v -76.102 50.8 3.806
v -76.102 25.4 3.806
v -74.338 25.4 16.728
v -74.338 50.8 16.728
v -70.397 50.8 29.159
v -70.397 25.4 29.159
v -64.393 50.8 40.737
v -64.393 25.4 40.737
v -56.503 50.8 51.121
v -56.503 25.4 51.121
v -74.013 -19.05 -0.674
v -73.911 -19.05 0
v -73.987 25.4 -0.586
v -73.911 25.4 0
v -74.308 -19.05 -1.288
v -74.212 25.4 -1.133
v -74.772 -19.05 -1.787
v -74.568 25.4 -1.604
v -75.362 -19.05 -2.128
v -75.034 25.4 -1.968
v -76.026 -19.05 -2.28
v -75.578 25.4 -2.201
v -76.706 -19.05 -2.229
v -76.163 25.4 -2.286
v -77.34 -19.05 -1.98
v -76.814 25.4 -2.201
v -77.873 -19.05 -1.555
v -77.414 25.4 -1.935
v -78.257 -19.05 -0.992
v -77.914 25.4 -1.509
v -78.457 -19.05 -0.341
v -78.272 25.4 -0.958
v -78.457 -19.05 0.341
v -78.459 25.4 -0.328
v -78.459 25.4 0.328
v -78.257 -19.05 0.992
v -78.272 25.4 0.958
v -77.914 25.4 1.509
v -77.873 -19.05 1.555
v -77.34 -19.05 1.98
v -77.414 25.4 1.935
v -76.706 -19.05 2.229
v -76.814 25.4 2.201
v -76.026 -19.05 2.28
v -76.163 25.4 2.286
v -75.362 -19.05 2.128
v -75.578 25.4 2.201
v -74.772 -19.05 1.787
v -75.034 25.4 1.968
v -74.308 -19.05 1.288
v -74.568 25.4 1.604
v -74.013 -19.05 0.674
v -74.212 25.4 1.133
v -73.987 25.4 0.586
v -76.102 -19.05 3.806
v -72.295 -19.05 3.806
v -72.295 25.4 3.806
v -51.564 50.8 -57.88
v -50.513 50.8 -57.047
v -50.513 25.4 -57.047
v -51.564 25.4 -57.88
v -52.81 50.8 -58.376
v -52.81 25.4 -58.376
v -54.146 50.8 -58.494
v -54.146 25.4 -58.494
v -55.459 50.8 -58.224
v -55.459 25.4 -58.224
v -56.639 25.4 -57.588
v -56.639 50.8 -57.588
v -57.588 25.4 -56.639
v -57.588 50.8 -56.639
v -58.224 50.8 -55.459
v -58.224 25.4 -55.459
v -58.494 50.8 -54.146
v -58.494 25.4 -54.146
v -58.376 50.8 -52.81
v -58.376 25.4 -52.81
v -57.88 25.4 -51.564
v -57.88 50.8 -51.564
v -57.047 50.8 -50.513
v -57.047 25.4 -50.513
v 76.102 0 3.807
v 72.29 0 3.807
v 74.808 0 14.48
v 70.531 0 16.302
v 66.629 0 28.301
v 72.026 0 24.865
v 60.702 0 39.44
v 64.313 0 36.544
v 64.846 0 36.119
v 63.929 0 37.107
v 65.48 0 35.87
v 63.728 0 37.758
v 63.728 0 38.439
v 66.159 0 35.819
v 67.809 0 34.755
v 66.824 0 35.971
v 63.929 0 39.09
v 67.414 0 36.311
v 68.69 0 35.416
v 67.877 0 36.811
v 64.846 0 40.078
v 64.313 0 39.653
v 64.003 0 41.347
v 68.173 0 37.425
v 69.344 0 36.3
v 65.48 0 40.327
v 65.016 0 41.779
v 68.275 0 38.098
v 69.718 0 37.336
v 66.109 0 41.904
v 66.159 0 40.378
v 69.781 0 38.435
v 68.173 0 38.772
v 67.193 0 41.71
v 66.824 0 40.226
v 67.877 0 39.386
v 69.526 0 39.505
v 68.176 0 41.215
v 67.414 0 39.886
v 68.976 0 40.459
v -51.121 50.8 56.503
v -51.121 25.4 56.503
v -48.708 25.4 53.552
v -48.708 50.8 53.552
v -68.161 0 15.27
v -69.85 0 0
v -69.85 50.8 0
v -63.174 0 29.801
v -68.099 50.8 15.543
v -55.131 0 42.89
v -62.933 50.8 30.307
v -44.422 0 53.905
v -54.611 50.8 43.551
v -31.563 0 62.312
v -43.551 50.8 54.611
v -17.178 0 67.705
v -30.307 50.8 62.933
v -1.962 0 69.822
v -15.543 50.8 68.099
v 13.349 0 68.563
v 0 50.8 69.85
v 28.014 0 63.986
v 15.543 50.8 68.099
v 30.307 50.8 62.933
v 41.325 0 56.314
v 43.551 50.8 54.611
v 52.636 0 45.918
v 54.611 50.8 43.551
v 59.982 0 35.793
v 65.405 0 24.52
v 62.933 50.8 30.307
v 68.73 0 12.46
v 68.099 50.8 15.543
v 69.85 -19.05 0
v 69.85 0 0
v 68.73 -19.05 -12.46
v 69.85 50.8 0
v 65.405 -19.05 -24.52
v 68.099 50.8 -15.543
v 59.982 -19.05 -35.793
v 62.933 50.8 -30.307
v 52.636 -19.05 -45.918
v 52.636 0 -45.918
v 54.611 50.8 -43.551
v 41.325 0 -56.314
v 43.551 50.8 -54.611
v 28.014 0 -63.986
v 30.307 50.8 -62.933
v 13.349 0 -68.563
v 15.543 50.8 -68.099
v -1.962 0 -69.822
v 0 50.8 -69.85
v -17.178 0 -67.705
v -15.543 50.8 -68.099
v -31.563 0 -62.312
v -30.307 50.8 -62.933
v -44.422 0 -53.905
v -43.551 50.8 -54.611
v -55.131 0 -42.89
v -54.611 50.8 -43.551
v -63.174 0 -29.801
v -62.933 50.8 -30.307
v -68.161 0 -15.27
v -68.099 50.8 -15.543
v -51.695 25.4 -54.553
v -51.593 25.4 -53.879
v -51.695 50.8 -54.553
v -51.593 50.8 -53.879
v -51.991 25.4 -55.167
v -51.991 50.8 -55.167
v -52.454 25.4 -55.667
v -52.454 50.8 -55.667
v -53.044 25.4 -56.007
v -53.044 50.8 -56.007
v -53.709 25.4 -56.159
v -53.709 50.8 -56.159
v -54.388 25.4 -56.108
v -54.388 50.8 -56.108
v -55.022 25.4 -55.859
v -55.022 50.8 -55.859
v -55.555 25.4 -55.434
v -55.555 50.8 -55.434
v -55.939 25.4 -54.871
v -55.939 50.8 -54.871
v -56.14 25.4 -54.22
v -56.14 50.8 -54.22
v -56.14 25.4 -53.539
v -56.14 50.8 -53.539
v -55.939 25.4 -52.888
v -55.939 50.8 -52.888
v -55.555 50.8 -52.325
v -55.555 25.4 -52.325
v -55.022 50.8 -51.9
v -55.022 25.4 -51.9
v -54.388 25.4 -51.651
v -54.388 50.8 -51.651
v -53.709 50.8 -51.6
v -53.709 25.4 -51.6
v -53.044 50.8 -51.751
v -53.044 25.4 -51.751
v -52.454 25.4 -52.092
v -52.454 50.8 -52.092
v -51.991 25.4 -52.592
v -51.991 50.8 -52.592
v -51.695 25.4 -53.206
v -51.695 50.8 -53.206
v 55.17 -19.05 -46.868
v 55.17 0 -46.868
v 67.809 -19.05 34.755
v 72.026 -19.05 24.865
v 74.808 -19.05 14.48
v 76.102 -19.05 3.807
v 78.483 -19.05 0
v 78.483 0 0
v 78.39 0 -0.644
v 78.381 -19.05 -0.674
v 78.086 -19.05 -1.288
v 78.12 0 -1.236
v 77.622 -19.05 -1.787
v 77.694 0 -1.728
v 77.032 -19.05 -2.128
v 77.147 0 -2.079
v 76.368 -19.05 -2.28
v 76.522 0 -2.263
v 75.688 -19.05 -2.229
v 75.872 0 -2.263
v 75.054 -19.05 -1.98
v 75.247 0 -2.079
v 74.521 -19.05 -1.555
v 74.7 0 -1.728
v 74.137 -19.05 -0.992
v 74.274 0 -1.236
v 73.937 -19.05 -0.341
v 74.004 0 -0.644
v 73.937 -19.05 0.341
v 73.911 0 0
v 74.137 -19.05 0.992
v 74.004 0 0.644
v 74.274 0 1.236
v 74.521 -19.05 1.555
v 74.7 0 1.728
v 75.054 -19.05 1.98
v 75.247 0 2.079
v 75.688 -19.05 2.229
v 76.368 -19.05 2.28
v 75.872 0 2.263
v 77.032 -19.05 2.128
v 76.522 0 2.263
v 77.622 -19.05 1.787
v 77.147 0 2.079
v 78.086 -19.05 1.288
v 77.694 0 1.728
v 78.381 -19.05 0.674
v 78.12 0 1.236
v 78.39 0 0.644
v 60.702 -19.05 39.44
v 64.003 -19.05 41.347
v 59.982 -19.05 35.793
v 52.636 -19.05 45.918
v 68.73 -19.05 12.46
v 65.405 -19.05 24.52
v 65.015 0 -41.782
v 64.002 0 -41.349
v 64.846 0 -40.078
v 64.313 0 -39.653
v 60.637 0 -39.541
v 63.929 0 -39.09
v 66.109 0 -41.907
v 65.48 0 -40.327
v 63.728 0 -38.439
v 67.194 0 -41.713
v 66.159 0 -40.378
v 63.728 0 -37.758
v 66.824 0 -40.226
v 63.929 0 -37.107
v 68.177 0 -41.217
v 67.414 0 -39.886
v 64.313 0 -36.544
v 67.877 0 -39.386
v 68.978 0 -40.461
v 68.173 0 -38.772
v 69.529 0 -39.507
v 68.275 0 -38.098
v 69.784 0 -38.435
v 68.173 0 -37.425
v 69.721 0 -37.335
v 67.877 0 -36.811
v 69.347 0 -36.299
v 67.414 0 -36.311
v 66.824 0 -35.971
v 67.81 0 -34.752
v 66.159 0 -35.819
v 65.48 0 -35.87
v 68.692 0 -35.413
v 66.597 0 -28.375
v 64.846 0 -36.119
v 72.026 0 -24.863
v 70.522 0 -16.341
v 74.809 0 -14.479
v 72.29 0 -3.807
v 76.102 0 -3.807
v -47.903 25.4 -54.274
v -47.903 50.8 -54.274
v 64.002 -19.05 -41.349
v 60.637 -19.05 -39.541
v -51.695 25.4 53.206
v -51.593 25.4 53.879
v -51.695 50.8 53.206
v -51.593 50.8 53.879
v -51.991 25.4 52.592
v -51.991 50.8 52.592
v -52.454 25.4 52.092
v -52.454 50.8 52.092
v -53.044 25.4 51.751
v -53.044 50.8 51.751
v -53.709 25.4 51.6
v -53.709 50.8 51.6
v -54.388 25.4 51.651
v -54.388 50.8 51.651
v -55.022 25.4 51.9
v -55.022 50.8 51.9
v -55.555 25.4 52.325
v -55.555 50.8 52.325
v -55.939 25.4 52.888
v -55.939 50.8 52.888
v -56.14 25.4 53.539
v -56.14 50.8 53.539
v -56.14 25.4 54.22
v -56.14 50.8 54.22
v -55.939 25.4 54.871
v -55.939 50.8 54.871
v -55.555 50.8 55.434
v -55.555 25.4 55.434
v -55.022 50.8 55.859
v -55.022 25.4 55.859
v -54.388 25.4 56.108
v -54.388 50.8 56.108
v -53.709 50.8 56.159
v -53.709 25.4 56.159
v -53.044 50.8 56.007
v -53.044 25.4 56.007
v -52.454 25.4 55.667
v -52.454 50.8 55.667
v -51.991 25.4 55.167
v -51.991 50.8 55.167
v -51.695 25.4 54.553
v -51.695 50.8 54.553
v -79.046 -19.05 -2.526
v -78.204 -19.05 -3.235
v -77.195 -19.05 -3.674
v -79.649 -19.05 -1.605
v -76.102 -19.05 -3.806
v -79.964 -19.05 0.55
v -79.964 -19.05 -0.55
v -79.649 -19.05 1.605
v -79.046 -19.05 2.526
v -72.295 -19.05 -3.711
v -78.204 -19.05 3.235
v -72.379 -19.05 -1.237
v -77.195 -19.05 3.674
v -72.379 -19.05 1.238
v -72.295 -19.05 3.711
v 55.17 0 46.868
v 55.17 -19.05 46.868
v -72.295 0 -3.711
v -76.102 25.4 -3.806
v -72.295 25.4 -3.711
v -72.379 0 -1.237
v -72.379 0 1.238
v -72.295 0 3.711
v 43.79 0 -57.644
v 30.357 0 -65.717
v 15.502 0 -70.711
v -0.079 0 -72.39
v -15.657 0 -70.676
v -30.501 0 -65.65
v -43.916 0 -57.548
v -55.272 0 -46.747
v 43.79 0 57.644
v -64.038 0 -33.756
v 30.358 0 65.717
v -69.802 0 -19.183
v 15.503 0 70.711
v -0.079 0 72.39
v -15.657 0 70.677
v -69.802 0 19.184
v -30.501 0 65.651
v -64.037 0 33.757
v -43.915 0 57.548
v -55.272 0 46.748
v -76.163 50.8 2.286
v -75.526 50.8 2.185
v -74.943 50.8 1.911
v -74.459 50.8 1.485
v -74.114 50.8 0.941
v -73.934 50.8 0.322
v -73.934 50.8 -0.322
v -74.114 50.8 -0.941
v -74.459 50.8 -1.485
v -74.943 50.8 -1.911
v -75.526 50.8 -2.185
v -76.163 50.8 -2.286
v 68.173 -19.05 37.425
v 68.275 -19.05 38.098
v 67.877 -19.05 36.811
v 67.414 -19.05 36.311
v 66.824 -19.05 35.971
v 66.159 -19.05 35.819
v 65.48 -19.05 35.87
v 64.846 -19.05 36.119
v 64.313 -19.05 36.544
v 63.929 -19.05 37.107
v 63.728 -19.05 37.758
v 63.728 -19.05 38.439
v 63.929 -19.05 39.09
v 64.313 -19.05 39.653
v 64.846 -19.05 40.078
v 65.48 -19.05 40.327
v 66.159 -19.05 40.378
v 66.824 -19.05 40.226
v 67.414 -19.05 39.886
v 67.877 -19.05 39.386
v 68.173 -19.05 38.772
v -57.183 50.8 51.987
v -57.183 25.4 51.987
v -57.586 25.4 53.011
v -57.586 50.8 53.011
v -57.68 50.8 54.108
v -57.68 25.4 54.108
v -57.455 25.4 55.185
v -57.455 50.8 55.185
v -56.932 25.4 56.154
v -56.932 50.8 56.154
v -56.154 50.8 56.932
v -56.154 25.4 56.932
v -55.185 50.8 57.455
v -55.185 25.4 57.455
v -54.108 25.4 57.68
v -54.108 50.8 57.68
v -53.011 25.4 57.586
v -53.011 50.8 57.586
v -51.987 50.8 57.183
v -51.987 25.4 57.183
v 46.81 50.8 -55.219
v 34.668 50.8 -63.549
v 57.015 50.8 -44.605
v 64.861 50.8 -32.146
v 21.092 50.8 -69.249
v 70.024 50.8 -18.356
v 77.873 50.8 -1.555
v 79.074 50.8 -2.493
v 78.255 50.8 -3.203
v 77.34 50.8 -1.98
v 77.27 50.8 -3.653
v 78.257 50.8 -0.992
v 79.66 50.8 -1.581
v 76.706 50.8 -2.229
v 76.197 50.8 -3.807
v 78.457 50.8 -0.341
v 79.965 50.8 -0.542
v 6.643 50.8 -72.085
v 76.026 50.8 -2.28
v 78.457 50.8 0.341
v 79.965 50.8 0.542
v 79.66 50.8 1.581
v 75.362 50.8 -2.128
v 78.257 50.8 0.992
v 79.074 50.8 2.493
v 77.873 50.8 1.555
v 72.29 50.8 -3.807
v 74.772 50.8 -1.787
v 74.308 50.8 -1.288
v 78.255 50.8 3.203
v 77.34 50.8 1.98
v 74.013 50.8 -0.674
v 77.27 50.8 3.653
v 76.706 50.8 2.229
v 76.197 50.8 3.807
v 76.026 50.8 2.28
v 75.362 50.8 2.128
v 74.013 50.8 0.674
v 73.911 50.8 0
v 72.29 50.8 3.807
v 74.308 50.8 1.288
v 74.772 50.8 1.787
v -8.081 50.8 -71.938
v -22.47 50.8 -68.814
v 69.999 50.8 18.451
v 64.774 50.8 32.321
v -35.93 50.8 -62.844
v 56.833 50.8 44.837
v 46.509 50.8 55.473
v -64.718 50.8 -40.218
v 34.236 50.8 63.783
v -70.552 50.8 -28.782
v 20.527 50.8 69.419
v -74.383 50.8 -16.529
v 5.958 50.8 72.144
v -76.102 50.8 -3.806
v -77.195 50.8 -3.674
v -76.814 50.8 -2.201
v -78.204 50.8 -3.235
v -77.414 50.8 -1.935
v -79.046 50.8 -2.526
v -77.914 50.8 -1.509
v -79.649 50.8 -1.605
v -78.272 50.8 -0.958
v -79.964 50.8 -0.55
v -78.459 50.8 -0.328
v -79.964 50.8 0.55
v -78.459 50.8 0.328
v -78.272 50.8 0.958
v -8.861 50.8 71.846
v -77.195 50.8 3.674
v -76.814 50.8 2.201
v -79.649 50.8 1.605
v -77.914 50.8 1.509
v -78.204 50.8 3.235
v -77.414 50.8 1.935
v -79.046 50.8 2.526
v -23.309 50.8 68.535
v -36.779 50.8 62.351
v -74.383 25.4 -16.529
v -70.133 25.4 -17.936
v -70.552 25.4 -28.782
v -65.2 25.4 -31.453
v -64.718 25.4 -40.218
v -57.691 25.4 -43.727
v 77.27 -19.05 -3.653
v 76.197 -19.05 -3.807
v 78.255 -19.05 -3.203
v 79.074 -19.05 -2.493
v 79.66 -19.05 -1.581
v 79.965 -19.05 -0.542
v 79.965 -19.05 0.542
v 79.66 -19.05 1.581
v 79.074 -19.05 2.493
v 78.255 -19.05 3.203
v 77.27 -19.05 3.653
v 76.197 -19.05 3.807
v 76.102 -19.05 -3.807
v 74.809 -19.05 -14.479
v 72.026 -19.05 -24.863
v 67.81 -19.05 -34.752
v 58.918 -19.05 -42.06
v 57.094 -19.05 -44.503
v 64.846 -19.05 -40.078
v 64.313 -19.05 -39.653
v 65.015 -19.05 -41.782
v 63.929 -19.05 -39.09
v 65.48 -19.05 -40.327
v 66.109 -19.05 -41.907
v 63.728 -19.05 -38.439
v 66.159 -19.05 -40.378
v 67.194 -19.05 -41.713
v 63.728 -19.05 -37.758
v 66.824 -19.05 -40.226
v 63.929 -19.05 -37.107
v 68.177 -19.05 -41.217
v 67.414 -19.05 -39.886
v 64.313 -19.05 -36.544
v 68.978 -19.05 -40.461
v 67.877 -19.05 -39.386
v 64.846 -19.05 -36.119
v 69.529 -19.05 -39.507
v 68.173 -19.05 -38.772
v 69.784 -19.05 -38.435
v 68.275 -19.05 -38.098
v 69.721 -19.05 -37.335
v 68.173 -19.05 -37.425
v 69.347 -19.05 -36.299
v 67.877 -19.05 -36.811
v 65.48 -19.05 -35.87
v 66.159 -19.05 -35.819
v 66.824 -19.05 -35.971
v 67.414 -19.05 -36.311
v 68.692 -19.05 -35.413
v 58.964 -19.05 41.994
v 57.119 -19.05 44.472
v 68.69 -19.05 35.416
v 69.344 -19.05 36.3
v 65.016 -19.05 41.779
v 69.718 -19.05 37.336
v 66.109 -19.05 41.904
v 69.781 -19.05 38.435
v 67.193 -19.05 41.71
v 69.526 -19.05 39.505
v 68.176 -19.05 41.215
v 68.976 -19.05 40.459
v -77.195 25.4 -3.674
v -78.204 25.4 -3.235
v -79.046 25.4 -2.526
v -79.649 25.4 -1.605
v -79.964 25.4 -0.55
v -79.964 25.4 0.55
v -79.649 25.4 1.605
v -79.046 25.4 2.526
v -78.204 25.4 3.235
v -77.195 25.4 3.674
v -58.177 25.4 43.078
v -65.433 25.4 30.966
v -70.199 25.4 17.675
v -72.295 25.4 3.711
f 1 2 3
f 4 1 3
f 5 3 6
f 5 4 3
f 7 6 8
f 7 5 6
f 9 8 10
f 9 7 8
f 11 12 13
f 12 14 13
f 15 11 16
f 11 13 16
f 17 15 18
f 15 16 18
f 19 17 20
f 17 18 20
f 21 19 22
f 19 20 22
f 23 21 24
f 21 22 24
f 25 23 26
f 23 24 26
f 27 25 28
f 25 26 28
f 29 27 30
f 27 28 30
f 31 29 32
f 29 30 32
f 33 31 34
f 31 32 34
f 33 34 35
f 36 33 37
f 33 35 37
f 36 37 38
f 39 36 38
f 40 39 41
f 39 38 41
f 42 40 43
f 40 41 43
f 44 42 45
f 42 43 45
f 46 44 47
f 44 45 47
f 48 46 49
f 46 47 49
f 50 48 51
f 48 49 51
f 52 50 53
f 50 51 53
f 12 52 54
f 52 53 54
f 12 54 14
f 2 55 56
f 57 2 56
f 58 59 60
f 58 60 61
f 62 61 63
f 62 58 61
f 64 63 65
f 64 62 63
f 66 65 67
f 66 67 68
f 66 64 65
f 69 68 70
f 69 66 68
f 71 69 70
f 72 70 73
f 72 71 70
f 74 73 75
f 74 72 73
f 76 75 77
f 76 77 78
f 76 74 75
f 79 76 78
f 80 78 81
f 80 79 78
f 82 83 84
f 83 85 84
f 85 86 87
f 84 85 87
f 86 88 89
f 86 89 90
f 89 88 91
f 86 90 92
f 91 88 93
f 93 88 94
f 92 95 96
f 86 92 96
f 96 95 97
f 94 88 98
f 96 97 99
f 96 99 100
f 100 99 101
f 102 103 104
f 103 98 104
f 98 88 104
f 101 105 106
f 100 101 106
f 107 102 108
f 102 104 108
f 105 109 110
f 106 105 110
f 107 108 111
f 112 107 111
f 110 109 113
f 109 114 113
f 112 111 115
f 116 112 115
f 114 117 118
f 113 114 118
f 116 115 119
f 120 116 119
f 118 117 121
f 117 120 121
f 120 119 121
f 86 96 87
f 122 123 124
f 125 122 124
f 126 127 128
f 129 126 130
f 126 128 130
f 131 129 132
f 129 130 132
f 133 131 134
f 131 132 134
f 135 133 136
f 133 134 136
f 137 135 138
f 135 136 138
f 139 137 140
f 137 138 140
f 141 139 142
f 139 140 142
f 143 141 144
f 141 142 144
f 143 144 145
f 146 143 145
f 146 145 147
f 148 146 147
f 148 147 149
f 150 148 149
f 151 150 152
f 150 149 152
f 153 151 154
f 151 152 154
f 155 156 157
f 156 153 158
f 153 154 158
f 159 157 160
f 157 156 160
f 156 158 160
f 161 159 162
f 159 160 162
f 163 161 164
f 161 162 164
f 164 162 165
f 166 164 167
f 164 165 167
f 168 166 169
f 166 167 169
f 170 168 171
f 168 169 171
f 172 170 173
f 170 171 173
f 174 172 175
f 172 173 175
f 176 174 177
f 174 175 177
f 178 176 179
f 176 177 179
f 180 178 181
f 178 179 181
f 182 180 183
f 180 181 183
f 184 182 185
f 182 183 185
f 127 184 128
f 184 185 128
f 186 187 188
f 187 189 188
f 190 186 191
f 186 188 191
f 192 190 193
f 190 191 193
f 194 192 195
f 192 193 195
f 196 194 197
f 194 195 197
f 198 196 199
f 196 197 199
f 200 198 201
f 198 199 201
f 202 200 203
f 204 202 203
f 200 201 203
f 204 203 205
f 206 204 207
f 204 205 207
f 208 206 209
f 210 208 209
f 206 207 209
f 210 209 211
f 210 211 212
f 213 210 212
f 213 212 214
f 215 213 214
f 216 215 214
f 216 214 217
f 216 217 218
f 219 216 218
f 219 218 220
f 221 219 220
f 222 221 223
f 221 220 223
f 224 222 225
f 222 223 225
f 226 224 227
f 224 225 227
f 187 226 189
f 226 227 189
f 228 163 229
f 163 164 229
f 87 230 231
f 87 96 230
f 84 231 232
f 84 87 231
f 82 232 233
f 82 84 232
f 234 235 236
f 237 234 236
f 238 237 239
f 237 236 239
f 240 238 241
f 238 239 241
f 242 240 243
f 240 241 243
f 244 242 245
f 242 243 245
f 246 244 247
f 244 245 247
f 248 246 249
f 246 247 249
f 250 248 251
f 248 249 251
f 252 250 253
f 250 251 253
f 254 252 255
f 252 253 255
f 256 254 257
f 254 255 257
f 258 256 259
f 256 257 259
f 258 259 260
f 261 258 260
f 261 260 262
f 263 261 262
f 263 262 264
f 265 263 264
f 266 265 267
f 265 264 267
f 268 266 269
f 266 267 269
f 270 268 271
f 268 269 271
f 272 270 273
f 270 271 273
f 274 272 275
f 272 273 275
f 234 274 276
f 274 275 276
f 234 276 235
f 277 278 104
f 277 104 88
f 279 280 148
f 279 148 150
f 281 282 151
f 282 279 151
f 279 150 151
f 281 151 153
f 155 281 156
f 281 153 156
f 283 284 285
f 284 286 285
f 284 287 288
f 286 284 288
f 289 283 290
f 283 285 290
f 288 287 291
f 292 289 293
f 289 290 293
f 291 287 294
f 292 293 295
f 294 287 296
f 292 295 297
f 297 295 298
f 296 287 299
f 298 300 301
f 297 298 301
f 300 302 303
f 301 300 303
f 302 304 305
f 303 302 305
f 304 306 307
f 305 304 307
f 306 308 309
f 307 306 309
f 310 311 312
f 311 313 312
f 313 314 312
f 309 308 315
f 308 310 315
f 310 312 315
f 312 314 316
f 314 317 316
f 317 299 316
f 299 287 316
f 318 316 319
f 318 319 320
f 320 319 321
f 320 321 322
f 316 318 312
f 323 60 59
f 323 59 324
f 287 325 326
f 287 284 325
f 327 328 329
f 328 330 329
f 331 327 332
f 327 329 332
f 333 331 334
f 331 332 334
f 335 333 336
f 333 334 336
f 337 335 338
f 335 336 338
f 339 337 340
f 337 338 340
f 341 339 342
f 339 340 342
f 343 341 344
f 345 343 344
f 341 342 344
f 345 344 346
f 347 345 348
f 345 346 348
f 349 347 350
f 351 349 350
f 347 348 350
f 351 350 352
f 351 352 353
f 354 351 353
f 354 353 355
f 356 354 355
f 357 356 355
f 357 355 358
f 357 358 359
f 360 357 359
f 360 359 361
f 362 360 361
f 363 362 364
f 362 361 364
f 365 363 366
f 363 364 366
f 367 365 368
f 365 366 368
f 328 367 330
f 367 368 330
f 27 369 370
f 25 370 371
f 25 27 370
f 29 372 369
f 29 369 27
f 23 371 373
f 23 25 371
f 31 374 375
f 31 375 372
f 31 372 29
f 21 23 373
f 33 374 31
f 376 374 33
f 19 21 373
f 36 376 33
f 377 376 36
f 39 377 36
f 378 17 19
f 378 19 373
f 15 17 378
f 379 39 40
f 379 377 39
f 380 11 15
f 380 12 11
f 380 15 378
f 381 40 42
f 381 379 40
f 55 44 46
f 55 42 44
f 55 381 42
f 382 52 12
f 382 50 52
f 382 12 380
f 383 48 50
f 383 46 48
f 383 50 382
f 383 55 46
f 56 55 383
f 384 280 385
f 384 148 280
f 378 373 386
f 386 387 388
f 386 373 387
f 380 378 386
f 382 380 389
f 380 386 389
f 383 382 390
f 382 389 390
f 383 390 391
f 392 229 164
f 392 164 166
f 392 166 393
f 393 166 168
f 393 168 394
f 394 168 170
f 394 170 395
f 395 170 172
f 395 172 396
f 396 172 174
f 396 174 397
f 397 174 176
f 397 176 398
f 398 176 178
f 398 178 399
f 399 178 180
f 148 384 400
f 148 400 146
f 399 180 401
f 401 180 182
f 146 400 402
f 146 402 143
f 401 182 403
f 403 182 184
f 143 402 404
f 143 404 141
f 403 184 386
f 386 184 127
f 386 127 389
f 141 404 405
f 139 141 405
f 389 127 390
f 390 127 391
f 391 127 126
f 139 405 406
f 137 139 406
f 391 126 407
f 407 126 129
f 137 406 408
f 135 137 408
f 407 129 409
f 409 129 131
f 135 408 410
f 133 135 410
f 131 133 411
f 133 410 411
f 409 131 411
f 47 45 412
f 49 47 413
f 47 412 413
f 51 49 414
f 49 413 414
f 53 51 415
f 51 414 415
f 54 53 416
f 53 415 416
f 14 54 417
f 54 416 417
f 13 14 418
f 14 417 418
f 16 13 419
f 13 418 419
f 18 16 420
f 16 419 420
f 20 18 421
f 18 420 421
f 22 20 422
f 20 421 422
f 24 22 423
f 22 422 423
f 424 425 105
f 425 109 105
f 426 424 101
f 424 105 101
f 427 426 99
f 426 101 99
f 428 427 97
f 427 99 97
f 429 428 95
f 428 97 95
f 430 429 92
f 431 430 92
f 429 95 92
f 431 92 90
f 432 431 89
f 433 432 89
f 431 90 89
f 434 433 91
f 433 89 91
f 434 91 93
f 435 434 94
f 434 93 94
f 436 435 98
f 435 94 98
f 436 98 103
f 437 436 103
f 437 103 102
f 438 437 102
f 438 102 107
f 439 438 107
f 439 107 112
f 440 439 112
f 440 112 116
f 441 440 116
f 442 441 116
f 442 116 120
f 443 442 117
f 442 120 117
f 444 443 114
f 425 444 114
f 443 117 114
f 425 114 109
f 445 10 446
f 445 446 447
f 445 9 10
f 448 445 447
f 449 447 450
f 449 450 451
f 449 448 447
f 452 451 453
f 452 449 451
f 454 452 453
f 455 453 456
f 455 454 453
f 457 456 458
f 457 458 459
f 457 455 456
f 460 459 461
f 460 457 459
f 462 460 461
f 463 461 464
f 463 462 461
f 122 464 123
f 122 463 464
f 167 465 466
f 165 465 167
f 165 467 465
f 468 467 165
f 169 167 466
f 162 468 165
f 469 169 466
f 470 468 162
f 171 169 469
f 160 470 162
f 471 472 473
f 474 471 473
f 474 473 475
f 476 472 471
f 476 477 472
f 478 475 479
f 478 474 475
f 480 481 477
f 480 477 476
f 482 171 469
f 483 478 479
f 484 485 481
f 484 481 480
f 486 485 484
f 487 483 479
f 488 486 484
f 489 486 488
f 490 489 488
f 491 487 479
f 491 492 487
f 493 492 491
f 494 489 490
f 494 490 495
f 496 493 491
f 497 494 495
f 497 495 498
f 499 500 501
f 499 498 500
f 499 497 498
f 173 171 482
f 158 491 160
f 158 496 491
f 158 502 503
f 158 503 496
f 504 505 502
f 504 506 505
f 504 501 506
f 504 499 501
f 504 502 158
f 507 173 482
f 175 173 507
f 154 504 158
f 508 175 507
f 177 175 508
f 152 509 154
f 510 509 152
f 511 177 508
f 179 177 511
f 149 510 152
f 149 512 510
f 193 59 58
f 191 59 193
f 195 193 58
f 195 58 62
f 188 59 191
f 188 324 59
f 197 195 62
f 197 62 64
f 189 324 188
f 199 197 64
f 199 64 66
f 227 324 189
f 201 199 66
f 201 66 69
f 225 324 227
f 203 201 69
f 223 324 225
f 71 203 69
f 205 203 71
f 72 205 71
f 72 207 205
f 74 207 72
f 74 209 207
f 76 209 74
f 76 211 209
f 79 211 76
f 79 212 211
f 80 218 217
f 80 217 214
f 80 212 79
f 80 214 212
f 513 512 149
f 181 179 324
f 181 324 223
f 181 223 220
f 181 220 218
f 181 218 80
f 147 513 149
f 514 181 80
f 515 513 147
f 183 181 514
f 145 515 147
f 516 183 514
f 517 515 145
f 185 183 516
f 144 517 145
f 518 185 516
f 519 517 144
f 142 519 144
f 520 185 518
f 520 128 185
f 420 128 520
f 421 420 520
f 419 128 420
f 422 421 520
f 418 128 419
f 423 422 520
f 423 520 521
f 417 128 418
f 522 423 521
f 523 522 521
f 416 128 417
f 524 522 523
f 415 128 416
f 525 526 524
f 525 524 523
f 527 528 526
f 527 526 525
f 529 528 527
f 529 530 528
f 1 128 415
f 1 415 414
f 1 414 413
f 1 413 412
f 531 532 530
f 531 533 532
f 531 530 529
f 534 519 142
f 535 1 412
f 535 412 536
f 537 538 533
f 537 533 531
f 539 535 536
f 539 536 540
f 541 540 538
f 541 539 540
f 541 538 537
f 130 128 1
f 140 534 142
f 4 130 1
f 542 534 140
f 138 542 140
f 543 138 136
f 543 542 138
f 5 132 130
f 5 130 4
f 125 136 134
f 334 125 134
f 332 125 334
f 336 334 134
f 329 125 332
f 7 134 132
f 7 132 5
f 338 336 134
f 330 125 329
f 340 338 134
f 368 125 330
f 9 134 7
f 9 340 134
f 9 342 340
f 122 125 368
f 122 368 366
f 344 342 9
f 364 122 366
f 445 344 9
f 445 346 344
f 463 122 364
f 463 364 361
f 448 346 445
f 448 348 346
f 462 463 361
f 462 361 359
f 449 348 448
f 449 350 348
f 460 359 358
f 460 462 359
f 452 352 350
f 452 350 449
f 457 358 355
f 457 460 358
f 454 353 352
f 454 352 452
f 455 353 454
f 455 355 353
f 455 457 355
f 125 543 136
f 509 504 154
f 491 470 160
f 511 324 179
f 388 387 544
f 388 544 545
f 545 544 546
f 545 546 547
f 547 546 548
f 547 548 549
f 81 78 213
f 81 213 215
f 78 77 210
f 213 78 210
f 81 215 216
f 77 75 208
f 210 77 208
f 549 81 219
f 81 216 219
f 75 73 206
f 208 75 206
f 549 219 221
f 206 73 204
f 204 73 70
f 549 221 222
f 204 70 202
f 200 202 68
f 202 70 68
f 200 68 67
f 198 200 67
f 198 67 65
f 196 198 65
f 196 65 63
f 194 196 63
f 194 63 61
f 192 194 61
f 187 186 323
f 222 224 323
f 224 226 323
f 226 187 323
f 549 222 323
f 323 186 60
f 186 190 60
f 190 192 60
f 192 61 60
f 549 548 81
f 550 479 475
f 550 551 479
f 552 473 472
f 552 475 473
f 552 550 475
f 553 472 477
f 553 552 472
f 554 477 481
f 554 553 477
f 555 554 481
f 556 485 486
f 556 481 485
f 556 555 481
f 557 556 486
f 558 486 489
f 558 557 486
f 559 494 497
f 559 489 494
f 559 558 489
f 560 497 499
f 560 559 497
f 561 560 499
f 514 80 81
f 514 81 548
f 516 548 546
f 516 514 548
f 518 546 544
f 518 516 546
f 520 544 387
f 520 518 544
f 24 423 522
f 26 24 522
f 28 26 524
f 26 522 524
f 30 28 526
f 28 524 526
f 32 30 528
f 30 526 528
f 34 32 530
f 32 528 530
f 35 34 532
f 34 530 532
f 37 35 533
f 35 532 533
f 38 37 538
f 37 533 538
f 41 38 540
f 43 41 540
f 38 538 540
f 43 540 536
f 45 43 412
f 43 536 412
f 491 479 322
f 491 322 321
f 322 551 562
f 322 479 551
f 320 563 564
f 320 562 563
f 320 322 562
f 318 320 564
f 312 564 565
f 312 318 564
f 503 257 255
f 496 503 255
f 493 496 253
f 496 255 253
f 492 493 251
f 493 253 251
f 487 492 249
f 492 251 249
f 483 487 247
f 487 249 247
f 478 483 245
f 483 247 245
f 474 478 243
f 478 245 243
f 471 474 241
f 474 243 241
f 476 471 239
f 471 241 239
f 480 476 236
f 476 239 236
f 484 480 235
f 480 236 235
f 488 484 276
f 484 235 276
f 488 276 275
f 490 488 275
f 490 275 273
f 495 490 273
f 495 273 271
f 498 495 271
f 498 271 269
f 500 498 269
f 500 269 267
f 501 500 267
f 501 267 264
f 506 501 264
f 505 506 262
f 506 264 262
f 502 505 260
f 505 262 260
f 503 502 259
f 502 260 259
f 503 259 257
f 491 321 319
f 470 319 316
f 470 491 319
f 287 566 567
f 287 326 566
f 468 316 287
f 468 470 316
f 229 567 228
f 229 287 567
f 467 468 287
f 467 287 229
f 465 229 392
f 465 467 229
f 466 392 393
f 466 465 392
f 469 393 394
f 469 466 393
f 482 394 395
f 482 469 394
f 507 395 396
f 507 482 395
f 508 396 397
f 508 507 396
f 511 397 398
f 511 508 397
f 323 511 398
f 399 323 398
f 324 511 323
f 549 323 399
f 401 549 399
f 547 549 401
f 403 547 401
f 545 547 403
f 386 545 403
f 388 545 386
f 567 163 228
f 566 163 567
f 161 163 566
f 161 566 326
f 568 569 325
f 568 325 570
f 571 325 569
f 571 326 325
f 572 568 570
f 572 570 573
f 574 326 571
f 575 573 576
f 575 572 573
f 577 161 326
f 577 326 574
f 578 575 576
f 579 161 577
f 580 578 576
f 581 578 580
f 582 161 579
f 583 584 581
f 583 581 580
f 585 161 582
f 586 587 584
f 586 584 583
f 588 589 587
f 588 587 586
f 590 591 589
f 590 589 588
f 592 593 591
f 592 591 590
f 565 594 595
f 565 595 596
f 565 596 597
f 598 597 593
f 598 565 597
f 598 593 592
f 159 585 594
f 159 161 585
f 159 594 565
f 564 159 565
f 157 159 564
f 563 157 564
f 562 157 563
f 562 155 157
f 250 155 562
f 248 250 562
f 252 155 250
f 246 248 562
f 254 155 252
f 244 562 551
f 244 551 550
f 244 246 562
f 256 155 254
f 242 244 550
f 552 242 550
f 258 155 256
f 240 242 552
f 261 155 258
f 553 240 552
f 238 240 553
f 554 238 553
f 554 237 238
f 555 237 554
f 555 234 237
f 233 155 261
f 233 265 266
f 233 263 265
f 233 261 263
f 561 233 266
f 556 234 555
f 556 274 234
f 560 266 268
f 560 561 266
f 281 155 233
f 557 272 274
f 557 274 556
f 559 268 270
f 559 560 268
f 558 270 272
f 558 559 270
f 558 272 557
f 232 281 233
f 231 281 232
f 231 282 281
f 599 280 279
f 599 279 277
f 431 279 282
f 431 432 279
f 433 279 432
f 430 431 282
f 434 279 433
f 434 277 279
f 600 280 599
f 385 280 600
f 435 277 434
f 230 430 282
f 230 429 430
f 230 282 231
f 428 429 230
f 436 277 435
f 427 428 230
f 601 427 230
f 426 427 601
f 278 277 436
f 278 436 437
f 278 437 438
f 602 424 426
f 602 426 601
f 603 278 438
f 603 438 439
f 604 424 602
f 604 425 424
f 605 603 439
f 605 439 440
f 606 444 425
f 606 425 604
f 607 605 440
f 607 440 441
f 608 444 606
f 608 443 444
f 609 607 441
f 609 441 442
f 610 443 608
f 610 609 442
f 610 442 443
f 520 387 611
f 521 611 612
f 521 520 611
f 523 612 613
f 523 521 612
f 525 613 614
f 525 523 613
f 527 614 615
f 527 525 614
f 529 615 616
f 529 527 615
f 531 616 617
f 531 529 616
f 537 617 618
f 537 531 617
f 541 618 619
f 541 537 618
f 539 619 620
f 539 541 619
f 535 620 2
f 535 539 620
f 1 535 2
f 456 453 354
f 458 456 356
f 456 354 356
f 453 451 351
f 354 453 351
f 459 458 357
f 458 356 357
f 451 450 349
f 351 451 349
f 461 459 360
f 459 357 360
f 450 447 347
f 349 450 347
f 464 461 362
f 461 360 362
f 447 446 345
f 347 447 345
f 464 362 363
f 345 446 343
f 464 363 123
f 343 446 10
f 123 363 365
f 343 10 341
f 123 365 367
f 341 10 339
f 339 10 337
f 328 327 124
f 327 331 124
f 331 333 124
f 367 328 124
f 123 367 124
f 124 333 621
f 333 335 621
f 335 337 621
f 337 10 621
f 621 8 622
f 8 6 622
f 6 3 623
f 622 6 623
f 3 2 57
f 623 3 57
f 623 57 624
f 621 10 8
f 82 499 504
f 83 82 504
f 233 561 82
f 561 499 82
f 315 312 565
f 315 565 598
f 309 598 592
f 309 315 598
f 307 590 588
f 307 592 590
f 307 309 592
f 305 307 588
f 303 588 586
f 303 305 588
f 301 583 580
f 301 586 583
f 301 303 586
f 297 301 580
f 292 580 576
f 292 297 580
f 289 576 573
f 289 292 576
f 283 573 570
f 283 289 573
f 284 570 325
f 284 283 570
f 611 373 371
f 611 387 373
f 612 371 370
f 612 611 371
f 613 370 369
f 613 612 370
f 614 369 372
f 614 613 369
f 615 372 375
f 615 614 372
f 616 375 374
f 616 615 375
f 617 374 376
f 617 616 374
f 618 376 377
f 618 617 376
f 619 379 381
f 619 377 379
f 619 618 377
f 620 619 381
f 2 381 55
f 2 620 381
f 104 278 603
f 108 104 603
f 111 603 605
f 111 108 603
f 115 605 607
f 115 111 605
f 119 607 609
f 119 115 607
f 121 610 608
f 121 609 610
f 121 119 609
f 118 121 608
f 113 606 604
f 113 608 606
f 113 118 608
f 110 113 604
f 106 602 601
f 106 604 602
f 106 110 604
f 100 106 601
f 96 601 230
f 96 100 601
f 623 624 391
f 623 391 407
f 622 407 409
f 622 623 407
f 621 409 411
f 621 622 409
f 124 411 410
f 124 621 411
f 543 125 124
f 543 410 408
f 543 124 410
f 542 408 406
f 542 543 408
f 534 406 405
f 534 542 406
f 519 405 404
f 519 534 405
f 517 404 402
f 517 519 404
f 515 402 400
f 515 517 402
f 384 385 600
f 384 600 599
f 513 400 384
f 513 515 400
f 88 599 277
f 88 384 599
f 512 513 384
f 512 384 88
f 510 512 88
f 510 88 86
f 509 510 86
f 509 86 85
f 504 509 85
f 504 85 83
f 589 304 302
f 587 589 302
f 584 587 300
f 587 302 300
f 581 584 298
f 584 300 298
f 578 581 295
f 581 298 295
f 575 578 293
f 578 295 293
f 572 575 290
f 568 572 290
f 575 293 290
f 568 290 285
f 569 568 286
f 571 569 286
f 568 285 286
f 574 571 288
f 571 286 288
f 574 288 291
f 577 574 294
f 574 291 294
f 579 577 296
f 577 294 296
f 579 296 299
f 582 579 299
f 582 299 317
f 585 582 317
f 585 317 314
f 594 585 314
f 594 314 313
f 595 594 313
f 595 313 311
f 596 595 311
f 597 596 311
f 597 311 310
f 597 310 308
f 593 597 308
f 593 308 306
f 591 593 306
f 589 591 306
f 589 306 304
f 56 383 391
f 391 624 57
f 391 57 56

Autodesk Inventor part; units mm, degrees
ref_plane "YZ Plane" through (0, 0, 0) normal (1, 0, 0) x (0, 1, 0)
ref_plane "XZ Plane" through (0, 0, 0) normal (0, 1, 0) x (-1, 0, 0)
ref_plane "XY Plane" through (0, 0, 0) normal (0, 0, 1) x (1, 0, 0)
sketch "Sketch1" plane through (0, 0, 0) normal (0, 1, 0) x (-1, 0, 0)
  circle A0 centre (0, 0) radius 72.39
  circle A1 centre (0, 0) radius 69.85
  arc A2 (-76.197, 3.807) -> (-76.197, -3.807) centre (-76.197, 0) ccw
  circle A3 centre (-76.197, 0) radius 2.286
  line L0 (-76.197, 3.807) -> (-72.2898, 3.807)
  line L1 (-76.197, -3.807) -> (-72.2898, -3.807)
  dimension "d0" = 144.78
  dimension "d1" = 139.7
  dimension "d2" = 4.572
extrude "Extrusion1" add sketch "Sketch1" along normal blind 50.8
sketch "Sketch2" plane through (0, 50.8, 0) normal (0, 1, 0) x (1, 0, 0)
  circle A0 centre (76.197, 0) radius 2.286 projected
  circle A1 centre (0, 0) radius 76.197
  arc A2 (-76.1019, 3.8058) -> (-76.1019, -3.8058) centre (-76.197, 0) ccw
  arc A3 (72.2898, 3.807) -> (72.2898, -3.807) centre (0, 0) ccw projected
  arc A4 (-76.1627, 2.2857) -> (-76.1627, -2.2857) centre (-76.197, 0) ccw
  line L0 (-76.197, -3.807) -> (-72.2898, -3.807)
  line L1 (-76.197, 3.807) -> (-72.39, 3.807)
  line L2 (-51.1875, 51.1875) -> (-53.8794, 53.8794)
  line L3 (0, 0) -> (76.197, 0) construction
  line L4 (0, 0) -> (76.197, 0) construction
  arc A5 (-56.5033, -51.1211) -> (-50.7603, -56.0621) centre (-53.8794, -53.8794) ccw
  line L5 (-51.1211, -56.5033) -> (-48.7078, -53.5524)
  line L6 (-56.5033, -51.1211) -> (-53.744, -48.4963)
  circle A6 centre (-53.8794, -53.8794) radius 2.286
  circle A7 centre (-53.8794, 53.8794) radius 2.286
  line L7 (-57.0474, 50.5132) -> (-54.2736, 47.9029)
  line L8 (-50.5132, 57.0474) -> (-47.9029, 54.2736)
  arc A8 (-50.5132, 57.0474) -> (-57.0474, 50.5132) centre (-53.8794, 53.8794) ccw
  line L9 (0, 0) -> (-26.9652, -26.9652)
  circle A9 centre (-76.197, 0) radius 2.286
  point P0 (-76.1627, -2.2857)
  dimension "d5" = 4.572
  dimension "d6" = 135
  dimension "d8" = 4.572
  dimension "d9" = 4.572
extrude "Extrusion2" add sketch "Sketch2" against normal blind 25.4 contours L8 A3 L2 A7 A1 | A1 A7 A8 | A5 A1 A6 | A1 A6 L6 A3 L5 | L7 A3 L0 A1 A9 | A1 A7 L2 A3 L7 | A1 L0 A3 L6 | A1 A4 A2
sketch "Sketch3" plane through (0, 0, 0) normal (0, -1, 0) x (1, 0, 0)
  line L0 (72.2898, 3.807) -> (76.197, 3.807) projected
  circle A0 centre (0, 0) radius 72.39
  circle A1 centre (0, 0) radius 69.85
  line L1 (-69.85, 0) -> (52.6357, 45.9184)
  circle A2 centre (0, 0) radius 69.85 projected
  line L2 (-69.85, 0) -> (52.6357, -45.9184)
  line L3 (52.6357, 45.9184) -> (55.1695, 46.8683)
  arc A3 (72.2898, 3.807) -> (-48.7078, 53.5524) centre (0, 0) ccw projected
  line L4 (52.6357, -45.9184) -> (55.1695, -46.8683)
  dimension "d12" = 130.81
extrude "Extrusion3" add sketch "Sketch3" along normal blind 19.05 contours A0 L4 A1 L3 picked at (58.6234, 40.6965)
sketch "Sketch4" plane through (0, 0, 0) normal (0, -1, 0) x (1, 0, 0)
  circle A0 centre (76.197, 0) radius 2.286 projected
  circle A1 centre (76.197, 0) radius 2.286
  arc A2 (76.197, -3.807) -> (76.197, 3.807) centre (76.197, 0) ccw
  line L0 (76.197, -3.807) -> (72.2898, -3.807) projected
  line L1 (76.197, -3.807) -> (72.2898, -3.807)
  line L2 (72.2898, 3.807) -> (76.197, 3.807) projected
  line L3 (76.197, 3.807) -> (72.2898, 3.807)
  arc A3 (72.2898, -3.807) -> (72.2898, 3.807) centre (0, 0) ccw projected
  line L4 (72.2898, 3.807) -> (72.2898, -3.807)
  circle A4 centre (0, 0) radius 76.197
  line L5 (0, 0) -> (76.197, 0) construction
  line L6 (0, 0) -> (76.197, 0) construction
  arc A5 (67.8091, 34.755) -> (64.0033, 41.3469) centre (65.9886, 38.0985) ccw
  arc A6 (64.0033, -41.3469) -> (67.8091, -34.755) centre (65.9886, -38.0985) ccw
  circle A7 centre (65.9886, -38.0985) radius 2.286
  circle A8 centre (65.9886, 38.0985) radius 2.286
  line L7 (64.0033, 41.3469) -> (60.7024, 39.4402)
  line L8 (67.8091, 34.755) -> (64.4936, 32.8768)
  arc A9 (55.1695, -46.8683) -> (55.1695, 46.8683) centre (0, 0) ccw projected
  line L9 (67.8105, -34.7524) -> (64.4936, -32.8768)
  line L10 (64.0017, -41.3494) -> (60.6368, -39.541)
  line L11 (64.0088, 36.9555) -> (65.9886, 38.0985)
  line L12 (62.689, -36.1935) -> (62.6916, -36.195)
  line L13 (64.0088, -36.9555) -> (65.9886, -38.0985)
  arc A10 (62.7648, -36.068) -> (62.6181, -36.3219) centre (65.9886, -38.0985) ccw
  arc A11 (64.0017, -41.3494) -> (67.8105, -34.7524) centre (65.9886, -38.0985) ccw
  point P0 (76.1019, -3.807)
  point P1 (76.1019, 3.807)
  dimension "d18" = 4.572
  dimension "d19" = 4.572
extrude "Extrusion4" add sketch "Sketch4" along normal blind 19.05 contours A0 A4 L2 A2 L0 | A0 A4 L0 A3 L2 | L2 A9 L8 A4 | A4 L9 A9 L0 | L8 A9 L7 A4 A8 | A4 A8 A5 | A11 A4 A6 | A4 A7 L10 A9 L9 | A6 A4 A7
sketch "Sketch5" plane through (0, 25.4, 0) normal (0, -1, 0) x (1, 0, 0)
  circle A0 centre (-76.197, 0) radius 2.286 projected
  circle A1 centre (-76.197, 0) radius 2.286
  arc A2 (-76.1019, 3.8058) -> (-76.1019, -3.8058) centre (-76.197, 0) ccw
  arc A3 (-76.1019, -3.8058) -> (-57.0474, -50.5132) centre (0, 0) ccw projected
  line L0 (-76.1019, -3.8058) -> (-72.2948, -3.7107)
  arc A4 (-48.7078, 53.5524) -> (-47.9029, -54.2736) centre (0, 0) ccw projected
  arc A5 (-56.5033, 51.1211) -> (-76.1019, 3.8058) centre (0, 0) ccw projected
  line L1 (-76.1019, 3.8058) -> (-72.2948, 3.8058)
  line L2 (-72.2948, -3.7107) -> (-72.2948, 3.8058)
  point P0 (-72.2948, 3.7107)
extrude "Extrusion5" add sketch "Sketch5" along normal blind 44.45 contours L1 L2 A4 L0 A2
properties part number "NewShooterCup"
